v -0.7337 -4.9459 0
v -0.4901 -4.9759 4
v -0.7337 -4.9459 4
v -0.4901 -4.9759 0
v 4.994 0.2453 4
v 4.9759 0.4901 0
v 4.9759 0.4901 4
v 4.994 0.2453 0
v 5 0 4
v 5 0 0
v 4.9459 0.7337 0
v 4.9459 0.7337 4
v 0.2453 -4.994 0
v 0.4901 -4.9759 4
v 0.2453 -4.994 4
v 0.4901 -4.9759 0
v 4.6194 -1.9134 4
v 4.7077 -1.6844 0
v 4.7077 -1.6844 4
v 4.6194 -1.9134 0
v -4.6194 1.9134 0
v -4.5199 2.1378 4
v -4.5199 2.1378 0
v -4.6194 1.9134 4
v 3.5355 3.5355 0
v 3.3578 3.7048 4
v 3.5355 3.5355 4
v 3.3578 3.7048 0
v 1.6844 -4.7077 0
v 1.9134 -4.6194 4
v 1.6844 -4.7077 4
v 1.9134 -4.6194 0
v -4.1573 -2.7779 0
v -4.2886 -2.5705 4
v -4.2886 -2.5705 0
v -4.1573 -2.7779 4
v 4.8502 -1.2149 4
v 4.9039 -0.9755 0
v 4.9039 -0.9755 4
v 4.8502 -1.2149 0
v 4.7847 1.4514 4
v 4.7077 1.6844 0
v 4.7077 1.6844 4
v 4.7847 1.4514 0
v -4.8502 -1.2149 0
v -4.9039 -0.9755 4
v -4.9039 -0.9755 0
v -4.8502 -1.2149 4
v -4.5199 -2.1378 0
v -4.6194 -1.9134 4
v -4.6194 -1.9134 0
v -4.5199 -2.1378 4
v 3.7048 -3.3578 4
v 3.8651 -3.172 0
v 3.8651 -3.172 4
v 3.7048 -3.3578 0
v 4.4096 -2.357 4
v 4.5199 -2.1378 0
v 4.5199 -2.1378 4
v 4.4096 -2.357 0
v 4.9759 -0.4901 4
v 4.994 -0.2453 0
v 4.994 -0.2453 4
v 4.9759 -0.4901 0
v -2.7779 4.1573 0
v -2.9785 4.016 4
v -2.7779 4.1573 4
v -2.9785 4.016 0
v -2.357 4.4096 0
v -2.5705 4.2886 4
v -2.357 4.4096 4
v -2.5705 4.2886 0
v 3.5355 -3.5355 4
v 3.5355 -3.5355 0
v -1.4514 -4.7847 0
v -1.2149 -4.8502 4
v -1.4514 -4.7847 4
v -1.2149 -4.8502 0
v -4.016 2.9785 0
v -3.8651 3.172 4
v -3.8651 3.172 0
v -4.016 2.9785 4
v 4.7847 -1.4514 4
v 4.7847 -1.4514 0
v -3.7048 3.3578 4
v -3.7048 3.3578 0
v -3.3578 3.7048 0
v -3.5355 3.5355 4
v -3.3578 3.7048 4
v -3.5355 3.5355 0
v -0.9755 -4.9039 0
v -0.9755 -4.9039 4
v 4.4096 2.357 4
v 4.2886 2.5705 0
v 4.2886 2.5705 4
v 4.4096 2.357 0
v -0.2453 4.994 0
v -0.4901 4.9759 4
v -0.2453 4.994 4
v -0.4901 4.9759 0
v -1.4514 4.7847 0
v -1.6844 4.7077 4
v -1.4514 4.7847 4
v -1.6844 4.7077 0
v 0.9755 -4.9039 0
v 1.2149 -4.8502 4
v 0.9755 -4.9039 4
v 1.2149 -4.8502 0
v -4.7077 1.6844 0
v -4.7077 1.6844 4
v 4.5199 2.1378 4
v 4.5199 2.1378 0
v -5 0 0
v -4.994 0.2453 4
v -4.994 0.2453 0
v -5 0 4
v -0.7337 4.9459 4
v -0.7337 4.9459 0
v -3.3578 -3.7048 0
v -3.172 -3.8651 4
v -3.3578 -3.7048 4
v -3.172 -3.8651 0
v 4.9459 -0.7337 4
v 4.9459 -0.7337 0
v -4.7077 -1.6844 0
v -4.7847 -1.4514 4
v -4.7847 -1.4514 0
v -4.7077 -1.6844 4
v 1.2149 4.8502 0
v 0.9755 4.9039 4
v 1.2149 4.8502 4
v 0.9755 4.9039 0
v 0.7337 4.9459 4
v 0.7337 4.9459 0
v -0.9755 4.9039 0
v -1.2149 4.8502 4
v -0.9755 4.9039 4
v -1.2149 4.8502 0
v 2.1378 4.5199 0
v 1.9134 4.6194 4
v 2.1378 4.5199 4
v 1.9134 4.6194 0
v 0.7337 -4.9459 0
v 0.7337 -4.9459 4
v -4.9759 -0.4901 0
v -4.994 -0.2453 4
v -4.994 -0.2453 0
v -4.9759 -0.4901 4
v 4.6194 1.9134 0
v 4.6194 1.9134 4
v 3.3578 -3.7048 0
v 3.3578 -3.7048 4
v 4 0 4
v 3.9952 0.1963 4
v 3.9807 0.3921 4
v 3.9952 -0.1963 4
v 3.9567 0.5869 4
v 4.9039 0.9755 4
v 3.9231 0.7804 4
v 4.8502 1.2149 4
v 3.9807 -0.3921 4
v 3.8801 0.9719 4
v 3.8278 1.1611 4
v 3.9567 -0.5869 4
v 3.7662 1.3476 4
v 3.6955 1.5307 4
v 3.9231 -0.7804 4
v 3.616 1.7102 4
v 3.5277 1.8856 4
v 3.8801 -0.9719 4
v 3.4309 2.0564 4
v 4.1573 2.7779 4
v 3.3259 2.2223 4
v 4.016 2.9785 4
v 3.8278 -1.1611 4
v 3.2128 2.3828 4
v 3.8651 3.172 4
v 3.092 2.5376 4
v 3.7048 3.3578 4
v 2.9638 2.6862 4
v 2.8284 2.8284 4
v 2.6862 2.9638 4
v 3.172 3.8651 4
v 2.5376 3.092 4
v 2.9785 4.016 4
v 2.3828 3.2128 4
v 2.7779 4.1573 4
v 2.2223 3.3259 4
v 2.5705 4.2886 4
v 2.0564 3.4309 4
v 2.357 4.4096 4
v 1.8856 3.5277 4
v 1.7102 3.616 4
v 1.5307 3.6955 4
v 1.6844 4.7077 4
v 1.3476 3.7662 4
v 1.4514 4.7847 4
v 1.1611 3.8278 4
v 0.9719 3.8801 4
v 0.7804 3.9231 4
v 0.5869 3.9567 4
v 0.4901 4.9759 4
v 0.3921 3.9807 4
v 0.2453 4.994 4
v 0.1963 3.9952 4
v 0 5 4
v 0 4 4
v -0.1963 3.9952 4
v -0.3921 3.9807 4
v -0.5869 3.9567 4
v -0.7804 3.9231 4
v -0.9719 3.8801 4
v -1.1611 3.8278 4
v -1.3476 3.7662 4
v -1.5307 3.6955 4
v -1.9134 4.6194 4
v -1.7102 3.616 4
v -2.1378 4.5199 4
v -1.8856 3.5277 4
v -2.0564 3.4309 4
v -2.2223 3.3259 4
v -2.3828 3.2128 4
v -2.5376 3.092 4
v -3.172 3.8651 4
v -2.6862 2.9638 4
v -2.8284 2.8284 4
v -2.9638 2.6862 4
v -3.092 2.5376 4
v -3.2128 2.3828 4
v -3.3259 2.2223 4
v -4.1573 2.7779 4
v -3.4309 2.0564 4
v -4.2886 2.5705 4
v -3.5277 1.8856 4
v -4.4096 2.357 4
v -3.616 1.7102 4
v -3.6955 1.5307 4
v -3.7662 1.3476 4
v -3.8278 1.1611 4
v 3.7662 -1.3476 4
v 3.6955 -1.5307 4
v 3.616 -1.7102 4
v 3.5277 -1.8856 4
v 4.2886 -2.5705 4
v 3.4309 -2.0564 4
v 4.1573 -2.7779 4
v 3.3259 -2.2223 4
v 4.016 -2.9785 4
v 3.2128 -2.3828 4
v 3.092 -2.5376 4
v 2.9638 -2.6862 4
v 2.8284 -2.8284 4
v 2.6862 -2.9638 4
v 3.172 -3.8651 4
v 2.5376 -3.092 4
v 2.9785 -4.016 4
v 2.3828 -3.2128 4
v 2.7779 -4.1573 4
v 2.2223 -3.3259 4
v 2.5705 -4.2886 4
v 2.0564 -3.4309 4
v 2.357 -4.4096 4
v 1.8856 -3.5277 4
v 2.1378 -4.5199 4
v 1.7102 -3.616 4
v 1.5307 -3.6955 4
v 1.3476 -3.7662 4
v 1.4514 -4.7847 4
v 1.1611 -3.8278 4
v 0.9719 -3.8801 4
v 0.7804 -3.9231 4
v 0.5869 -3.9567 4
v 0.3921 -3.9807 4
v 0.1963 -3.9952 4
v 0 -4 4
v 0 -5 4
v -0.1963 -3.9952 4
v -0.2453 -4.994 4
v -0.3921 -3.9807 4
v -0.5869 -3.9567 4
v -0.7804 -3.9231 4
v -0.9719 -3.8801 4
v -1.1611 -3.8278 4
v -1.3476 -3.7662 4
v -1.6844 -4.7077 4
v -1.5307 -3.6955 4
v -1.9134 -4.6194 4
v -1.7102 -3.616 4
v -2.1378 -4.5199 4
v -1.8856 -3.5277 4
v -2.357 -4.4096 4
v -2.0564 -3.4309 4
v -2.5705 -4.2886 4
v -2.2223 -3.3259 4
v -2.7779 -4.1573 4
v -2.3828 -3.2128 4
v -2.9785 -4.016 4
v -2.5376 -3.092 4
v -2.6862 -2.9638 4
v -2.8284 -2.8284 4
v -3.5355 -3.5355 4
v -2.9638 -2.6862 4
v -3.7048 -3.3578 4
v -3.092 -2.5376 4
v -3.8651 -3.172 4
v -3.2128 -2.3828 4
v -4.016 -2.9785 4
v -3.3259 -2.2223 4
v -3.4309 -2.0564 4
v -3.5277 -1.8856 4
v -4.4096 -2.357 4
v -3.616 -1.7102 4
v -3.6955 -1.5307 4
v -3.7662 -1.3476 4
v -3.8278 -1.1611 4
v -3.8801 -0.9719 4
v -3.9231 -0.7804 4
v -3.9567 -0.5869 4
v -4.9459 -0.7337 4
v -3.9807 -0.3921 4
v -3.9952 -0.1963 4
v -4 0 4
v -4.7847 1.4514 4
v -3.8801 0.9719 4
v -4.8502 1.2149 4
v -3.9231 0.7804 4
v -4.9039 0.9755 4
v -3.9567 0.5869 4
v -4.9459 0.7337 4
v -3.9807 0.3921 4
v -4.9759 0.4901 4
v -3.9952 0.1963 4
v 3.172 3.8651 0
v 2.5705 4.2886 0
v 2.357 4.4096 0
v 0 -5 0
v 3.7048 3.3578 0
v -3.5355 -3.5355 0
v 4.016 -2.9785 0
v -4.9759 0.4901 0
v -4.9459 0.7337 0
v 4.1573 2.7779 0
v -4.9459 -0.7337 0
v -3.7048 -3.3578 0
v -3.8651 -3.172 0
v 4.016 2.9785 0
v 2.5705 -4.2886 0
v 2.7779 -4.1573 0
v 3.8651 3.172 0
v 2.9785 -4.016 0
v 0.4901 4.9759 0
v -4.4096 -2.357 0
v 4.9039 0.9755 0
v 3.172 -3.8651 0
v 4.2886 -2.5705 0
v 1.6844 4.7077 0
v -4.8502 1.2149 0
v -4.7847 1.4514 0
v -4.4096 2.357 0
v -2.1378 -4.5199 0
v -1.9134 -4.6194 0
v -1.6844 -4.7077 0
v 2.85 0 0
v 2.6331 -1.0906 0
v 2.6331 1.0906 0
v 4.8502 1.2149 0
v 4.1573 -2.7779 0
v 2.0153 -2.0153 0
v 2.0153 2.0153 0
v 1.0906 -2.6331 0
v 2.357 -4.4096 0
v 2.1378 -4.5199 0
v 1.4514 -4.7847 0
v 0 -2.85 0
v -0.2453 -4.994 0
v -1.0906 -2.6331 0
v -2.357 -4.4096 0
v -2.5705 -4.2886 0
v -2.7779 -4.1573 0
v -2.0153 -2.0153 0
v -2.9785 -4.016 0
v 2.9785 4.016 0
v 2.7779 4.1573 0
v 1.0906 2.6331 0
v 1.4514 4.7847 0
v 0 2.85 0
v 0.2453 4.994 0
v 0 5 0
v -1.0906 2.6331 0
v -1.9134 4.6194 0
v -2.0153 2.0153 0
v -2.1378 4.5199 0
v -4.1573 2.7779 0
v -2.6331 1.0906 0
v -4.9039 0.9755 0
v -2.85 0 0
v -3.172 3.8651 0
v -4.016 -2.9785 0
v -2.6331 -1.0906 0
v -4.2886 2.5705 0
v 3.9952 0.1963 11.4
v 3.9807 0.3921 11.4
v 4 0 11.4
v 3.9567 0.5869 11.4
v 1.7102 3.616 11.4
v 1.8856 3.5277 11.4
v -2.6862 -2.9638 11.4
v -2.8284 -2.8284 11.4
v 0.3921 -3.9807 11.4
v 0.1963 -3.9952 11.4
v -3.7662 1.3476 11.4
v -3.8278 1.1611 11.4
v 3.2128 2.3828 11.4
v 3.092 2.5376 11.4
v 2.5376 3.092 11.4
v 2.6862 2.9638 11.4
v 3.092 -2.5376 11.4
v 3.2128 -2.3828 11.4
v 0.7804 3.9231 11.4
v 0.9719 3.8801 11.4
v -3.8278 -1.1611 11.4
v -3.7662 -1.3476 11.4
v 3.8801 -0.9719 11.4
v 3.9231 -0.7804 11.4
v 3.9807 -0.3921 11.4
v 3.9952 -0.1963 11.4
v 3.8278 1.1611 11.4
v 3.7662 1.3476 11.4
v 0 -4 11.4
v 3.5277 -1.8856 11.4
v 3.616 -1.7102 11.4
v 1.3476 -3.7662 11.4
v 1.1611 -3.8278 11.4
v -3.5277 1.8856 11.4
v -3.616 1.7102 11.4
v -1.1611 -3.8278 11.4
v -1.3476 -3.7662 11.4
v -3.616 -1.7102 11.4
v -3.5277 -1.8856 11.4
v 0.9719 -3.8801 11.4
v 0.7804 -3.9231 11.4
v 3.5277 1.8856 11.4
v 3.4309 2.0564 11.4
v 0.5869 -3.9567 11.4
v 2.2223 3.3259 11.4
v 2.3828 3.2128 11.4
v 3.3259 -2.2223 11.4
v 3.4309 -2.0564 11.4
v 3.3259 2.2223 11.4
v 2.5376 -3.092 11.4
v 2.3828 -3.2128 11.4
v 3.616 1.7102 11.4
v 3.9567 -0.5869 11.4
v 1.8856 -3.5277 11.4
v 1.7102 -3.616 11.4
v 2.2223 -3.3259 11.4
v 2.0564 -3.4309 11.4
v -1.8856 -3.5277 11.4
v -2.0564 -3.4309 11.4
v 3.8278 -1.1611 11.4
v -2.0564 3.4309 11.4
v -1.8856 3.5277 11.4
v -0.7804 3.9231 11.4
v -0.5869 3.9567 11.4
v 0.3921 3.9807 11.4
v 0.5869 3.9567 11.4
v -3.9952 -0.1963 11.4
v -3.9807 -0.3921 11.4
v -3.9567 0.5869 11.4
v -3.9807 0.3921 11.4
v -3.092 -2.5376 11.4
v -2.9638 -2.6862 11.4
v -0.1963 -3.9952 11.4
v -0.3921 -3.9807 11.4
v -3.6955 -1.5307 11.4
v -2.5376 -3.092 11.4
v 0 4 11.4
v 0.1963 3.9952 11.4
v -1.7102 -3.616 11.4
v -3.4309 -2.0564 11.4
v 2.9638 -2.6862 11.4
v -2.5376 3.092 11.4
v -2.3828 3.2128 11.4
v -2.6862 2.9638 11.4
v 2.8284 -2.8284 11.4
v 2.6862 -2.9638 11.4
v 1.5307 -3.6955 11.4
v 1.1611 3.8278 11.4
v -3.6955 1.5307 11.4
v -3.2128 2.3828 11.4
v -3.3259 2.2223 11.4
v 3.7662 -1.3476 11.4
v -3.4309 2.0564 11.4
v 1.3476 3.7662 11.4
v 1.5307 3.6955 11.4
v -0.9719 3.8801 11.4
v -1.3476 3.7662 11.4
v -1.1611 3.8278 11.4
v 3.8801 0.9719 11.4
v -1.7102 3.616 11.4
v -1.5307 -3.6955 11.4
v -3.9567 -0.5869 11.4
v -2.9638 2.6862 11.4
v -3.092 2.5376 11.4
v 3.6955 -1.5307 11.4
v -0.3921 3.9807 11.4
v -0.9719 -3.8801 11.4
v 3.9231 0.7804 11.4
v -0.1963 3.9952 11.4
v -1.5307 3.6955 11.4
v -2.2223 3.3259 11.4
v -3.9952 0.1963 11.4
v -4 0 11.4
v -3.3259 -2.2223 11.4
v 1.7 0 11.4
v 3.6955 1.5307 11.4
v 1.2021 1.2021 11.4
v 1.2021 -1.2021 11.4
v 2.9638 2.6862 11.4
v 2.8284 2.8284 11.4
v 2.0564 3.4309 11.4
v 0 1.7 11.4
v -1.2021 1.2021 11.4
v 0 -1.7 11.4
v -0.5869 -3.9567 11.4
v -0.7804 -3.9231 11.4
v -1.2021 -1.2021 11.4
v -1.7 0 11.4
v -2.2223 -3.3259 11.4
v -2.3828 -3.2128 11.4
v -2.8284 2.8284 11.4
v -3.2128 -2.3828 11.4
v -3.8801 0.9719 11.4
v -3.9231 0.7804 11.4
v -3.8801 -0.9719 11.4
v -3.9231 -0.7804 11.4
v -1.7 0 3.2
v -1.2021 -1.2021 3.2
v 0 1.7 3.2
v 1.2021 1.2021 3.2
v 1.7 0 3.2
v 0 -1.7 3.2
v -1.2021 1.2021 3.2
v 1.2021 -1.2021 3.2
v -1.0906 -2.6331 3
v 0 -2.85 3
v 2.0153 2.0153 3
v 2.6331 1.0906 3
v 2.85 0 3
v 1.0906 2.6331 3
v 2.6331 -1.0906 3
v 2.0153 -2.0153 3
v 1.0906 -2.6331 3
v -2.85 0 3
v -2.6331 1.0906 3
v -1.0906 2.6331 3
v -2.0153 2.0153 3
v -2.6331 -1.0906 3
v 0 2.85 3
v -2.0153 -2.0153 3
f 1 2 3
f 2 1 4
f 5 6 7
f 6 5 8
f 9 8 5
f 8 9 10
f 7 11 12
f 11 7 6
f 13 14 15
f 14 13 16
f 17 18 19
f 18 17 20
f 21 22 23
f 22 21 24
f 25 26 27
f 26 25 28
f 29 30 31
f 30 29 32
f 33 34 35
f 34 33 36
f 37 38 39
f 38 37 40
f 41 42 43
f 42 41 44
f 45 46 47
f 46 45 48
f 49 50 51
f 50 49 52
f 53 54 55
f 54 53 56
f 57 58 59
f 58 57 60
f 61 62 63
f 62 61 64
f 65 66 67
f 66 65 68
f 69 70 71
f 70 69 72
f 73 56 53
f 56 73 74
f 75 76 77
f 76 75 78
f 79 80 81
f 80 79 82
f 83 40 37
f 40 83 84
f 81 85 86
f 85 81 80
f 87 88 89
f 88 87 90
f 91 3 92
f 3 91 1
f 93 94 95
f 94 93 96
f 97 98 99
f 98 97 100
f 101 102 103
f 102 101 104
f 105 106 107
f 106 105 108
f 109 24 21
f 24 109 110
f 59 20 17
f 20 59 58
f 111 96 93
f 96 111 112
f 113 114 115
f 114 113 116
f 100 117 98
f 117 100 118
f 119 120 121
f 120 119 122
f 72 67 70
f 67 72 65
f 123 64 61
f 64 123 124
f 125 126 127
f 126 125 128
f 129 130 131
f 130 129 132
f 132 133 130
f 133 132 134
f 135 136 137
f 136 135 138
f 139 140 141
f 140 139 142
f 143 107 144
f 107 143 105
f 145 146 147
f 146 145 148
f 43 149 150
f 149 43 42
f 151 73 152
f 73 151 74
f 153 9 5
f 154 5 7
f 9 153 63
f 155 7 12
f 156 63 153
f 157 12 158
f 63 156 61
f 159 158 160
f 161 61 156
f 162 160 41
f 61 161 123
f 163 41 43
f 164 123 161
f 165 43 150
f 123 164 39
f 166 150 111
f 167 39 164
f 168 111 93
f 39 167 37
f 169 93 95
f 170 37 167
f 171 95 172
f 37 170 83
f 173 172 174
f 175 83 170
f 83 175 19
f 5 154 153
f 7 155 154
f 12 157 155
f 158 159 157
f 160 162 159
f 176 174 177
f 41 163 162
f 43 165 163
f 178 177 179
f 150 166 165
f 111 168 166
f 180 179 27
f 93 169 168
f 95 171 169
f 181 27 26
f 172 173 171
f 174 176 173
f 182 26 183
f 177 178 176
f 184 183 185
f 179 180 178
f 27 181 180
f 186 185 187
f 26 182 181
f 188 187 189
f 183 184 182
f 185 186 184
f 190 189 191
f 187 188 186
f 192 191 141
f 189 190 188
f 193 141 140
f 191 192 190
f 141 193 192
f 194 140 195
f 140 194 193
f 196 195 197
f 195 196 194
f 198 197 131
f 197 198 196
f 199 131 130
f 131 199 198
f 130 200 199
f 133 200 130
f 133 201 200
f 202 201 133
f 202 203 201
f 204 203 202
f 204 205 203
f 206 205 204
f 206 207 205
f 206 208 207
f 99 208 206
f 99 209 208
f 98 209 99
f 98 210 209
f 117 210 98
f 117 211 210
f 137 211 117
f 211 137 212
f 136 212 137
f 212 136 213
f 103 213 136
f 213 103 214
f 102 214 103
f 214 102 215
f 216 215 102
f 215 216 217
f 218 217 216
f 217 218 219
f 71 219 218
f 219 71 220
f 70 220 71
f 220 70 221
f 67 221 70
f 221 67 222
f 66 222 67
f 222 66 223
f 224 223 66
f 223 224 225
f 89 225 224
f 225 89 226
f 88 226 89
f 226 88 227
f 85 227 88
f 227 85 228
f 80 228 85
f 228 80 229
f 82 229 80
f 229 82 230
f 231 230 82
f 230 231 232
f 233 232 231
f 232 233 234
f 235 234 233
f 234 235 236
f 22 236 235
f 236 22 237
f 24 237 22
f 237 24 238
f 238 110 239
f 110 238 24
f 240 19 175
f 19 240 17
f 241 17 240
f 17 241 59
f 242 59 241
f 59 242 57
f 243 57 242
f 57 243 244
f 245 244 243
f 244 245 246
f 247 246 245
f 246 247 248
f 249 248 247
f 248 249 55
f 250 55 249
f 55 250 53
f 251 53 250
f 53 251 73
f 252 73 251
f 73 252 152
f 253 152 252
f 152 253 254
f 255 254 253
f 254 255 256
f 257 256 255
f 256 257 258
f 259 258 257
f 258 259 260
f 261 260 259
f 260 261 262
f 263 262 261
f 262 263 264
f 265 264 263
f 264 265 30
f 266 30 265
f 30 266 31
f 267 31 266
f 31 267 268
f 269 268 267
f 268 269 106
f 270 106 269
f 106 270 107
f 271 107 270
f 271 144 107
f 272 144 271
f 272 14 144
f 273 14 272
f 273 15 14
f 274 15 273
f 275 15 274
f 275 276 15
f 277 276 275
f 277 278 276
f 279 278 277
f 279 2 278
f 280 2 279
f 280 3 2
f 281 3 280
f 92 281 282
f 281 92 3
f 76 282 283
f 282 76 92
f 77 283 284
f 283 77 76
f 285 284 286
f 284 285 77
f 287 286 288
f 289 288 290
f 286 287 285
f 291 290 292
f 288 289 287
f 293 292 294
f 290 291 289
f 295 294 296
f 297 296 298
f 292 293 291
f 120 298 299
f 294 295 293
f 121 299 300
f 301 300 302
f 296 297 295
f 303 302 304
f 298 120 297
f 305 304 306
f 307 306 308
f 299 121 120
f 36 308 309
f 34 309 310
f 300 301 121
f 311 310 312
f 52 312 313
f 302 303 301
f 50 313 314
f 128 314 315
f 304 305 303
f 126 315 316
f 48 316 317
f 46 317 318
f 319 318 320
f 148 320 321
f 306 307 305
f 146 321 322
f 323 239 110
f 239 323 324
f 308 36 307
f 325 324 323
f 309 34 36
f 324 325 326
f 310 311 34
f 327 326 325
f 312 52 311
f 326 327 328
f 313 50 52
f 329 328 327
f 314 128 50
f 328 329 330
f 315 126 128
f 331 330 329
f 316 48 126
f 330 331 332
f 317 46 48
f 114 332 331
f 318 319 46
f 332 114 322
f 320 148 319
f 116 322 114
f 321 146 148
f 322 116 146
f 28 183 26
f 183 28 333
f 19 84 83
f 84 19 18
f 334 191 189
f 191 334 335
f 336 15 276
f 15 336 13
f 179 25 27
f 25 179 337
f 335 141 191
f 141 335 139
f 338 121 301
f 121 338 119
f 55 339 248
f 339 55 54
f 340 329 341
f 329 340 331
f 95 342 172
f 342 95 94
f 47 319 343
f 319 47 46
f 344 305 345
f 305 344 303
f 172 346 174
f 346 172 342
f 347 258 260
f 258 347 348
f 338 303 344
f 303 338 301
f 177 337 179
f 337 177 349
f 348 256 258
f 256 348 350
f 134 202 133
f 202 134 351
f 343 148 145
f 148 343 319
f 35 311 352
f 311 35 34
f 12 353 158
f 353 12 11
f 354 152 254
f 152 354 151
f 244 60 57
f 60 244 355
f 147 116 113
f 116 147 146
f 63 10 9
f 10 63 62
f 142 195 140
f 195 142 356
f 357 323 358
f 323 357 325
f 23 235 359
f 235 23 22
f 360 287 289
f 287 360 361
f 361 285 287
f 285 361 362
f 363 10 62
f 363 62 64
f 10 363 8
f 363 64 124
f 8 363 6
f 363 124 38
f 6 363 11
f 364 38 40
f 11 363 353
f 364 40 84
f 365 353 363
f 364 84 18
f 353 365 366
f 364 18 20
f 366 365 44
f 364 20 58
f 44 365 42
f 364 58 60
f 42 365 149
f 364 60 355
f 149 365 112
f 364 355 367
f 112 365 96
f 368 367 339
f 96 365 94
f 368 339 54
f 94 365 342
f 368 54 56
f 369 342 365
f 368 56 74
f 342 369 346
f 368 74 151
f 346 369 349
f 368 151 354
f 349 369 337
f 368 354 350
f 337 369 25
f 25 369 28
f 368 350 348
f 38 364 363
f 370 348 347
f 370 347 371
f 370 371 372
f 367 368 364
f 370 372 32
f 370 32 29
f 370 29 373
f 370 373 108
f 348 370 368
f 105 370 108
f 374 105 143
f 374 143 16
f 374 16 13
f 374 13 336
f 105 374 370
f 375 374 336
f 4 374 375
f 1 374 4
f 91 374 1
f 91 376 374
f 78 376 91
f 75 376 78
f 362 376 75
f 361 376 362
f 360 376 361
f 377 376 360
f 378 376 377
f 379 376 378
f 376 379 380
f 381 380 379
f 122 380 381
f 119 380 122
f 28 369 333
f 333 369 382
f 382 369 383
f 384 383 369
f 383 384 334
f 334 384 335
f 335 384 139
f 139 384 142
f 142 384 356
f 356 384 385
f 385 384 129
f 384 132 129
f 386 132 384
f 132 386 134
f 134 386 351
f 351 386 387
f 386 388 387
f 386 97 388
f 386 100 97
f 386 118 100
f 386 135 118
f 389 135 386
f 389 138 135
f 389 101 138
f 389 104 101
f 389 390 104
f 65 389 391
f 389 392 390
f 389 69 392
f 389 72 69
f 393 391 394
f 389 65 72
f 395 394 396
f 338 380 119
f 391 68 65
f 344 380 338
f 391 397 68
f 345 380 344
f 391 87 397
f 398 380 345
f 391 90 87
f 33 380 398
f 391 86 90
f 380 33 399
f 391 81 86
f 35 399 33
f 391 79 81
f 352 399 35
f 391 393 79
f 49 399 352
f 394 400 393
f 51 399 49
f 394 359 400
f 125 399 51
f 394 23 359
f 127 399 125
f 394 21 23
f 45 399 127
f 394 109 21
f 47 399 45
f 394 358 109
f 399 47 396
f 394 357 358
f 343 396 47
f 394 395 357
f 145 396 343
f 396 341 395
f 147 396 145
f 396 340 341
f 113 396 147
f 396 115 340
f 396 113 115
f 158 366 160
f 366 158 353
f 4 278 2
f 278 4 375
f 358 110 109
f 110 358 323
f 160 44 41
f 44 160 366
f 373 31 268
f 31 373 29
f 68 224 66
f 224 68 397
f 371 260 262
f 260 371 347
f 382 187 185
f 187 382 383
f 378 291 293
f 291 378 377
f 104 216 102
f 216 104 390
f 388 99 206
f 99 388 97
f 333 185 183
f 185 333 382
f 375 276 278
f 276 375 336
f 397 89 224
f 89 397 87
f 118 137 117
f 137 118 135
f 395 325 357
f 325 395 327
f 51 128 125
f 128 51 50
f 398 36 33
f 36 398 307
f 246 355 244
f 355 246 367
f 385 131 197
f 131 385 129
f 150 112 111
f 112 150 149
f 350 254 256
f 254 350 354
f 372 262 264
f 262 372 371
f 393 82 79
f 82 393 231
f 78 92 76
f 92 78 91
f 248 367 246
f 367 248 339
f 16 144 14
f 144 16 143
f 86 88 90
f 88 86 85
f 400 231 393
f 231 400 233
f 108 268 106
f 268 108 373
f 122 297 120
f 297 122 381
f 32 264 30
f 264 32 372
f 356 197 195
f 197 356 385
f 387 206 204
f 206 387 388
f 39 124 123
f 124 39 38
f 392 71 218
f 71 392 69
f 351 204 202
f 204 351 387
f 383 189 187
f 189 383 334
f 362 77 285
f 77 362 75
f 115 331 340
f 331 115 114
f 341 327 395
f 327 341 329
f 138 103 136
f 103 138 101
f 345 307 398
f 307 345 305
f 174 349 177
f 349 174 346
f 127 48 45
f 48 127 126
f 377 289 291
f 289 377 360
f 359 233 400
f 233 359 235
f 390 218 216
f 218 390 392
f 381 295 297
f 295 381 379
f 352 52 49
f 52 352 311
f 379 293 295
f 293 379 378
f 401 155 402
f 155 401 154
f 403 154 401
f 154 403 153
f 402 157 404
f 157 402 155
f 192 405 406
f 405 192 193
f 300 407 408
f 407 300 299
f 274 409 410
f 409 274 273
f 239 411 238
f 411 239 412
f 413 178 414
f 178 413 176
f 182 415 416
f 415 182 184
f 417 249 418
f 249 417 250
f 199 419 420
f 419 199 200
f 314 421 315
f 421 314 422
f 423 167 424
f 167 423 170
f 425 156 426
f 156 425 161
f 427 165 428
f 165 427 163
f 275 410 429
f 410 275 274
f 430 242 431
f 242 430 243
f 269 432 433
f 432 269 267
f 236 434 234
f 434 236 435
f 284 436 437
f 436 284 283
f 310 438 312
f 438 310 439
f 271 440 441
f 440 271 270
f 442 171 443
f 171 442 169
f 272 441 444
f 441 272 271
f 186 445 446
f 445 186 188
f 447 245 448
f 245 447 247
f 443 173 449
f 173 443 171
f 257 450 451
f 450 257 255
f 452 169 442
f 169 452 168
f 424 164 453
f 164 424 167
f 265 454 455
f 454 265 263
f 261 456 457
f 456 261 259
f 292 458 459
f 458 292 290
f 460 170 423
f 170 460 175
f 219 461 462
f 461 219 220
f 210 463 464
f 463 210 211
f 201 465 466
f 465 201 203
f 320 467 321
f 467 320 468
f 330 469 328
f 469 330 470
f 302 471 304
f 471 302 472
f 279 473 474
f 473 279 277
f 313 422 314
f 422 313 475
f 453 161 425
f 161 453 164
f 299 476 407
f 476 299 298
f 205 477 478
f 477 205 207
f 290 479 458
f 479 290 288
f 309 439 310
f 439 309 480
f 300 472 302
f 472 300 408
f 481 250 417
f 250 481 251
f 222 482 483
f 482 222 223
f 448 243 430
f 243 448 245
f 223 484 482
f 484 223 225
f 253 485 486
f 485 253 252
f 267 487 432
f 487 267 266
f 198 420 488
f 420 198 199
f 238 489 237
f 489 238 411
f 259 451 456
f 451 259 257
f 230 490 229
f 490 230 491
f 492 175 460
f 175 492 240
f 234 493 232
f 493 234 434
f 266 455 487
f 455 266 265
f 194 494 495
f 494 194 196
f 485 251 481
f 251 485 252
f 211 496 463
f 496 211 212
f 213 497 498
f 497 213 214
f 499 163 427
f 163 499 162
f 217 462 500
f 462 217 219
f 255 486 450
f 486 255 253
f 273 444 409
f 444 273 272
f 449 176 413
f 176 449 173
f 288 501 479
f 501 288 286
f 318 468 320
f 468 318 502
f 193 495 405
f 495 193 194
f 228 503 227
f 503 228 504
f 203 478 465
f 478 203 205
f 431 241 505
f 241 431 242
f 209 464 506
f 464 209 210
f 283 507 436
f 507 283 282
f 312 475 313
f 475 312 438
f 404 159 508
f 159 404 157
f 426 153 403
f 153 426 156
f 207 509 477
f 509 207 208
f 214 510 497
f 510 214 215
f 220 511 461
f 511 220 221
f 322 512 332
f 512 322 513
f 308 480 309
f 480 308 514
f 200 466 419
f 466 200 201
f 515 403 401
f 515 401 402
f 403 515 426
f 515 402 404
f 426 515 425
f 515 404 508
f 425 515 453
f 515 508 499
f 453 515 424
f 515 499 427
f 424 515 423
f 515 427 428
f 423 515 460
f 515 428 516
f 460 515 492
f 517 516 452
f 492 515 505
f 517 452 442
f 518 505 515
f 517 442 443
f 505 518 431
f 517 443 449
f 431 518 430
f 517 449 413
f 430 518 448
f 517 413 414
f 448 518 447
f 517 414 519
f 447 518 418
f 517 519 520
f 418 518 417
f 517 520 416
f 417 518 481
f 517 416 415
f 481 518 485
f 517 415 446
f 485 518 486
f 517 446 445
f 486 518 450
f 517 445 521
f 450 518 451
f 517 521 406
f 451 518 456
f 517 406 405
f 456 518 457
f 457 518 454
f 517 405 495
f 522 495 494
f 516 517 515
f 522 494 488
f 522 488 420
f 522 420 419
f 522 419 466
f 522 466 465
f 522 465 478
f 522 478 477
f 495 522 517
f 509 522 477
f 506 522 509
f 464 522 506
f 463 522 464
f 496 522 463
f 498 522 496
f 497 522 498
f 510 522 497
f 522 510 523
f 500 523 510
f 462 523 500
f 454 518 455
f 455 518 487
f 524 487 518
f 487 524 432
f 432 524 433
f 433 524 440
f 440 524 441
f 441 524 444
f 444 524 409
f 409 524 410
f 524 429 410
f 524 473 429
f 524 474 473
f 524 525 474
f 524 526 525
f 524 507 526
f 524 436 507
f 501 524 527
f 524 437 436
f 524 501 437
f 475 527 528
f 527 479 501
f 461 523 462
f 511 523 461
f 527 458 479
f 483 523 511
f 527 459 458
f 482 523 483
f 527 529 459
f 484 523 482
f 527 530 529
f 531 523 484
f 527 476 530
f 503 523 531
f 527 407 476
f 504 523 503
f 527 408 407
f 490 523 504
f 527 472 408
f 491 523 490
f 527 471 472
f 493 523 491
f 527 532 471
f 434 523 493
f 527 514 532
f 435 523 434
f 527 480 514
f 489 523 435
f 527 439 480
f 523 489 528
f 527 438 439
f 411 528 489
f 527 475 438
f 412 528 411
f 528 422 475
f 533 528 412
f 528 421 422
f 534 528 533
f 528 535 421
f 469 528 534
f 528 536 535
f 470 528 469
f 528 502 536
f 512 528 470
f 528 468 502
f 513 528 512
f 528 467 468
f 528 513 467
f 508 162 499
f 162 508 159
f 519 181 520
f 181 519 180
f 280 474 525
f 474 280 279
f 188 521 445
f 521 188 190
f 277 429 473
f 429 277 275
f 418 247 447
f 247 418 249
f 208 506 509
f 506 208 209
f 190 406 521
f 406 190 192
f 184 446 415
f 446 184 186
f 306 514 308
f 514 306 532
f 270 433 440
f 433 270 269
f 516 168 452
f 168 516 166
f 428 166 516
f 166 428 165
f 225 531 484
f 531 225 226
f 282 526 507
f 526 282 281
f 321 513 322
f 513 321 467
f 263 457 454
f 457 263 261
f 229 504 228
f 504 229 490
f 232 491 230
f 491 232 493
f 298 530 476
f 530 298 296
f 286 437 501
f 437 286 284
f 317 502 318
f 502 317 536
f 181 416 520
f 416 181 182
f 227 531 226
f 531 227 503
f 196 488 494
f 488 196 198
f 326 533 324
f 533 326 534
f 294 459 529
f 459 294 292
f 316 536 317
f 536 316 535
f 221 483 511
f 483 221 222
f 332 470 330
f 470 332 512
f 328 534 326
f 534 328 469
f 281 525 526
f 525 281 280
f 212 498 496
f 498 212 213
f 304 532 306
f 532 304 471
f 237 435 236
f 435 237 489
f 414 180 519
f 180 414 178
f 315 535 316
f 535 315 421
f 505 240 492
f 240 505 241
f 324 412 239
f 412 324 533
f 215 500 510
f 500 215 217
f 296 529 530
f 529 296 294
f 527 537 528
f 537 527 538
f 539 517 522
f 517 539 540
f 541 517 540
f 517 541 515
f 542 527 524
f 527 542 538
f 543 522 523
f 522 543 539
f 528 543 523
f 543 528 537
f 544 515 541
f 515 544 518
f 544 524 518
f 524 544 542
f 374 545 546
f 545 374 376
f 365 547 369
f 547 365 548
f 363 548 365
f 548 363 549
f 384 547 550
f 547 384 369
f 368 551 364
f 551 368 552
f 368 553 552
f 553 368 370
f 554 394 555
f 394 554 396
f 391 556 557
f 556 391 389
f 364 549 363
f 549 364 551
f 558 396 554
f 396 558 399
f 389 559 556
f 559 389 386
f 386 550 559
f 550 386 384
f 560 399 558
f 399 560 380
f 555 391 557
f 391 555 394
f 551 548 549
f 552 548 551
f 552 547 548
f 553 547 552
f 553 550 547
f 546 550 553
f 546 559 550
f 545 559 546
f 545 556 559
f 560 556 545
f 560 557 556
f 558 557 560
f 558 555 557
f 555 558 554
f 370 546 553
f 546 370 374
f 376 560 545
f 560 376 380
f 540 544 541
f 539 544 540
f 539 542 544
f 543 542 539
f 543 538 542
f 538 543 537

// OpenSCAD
union() {
	difference() {
		difference() {
			union() {
				cylinder($fn = 128, d = 10, h = 4);
				cylinder($fn = 128, d = 8, h = 11.4000000000);
			}
			cylinder($fn = 8, h = 12.4000000000, r = 1.7000000000);
		}
		translate(v = [0, 0, -1]) {
			cylinder($fn = 16, h = 4, r = 2.8500000000);
		}
	}
	translate(v = [0, 0, 3]) {
		cylinder(d = 10, h = 0.2000000000);
	}
}
